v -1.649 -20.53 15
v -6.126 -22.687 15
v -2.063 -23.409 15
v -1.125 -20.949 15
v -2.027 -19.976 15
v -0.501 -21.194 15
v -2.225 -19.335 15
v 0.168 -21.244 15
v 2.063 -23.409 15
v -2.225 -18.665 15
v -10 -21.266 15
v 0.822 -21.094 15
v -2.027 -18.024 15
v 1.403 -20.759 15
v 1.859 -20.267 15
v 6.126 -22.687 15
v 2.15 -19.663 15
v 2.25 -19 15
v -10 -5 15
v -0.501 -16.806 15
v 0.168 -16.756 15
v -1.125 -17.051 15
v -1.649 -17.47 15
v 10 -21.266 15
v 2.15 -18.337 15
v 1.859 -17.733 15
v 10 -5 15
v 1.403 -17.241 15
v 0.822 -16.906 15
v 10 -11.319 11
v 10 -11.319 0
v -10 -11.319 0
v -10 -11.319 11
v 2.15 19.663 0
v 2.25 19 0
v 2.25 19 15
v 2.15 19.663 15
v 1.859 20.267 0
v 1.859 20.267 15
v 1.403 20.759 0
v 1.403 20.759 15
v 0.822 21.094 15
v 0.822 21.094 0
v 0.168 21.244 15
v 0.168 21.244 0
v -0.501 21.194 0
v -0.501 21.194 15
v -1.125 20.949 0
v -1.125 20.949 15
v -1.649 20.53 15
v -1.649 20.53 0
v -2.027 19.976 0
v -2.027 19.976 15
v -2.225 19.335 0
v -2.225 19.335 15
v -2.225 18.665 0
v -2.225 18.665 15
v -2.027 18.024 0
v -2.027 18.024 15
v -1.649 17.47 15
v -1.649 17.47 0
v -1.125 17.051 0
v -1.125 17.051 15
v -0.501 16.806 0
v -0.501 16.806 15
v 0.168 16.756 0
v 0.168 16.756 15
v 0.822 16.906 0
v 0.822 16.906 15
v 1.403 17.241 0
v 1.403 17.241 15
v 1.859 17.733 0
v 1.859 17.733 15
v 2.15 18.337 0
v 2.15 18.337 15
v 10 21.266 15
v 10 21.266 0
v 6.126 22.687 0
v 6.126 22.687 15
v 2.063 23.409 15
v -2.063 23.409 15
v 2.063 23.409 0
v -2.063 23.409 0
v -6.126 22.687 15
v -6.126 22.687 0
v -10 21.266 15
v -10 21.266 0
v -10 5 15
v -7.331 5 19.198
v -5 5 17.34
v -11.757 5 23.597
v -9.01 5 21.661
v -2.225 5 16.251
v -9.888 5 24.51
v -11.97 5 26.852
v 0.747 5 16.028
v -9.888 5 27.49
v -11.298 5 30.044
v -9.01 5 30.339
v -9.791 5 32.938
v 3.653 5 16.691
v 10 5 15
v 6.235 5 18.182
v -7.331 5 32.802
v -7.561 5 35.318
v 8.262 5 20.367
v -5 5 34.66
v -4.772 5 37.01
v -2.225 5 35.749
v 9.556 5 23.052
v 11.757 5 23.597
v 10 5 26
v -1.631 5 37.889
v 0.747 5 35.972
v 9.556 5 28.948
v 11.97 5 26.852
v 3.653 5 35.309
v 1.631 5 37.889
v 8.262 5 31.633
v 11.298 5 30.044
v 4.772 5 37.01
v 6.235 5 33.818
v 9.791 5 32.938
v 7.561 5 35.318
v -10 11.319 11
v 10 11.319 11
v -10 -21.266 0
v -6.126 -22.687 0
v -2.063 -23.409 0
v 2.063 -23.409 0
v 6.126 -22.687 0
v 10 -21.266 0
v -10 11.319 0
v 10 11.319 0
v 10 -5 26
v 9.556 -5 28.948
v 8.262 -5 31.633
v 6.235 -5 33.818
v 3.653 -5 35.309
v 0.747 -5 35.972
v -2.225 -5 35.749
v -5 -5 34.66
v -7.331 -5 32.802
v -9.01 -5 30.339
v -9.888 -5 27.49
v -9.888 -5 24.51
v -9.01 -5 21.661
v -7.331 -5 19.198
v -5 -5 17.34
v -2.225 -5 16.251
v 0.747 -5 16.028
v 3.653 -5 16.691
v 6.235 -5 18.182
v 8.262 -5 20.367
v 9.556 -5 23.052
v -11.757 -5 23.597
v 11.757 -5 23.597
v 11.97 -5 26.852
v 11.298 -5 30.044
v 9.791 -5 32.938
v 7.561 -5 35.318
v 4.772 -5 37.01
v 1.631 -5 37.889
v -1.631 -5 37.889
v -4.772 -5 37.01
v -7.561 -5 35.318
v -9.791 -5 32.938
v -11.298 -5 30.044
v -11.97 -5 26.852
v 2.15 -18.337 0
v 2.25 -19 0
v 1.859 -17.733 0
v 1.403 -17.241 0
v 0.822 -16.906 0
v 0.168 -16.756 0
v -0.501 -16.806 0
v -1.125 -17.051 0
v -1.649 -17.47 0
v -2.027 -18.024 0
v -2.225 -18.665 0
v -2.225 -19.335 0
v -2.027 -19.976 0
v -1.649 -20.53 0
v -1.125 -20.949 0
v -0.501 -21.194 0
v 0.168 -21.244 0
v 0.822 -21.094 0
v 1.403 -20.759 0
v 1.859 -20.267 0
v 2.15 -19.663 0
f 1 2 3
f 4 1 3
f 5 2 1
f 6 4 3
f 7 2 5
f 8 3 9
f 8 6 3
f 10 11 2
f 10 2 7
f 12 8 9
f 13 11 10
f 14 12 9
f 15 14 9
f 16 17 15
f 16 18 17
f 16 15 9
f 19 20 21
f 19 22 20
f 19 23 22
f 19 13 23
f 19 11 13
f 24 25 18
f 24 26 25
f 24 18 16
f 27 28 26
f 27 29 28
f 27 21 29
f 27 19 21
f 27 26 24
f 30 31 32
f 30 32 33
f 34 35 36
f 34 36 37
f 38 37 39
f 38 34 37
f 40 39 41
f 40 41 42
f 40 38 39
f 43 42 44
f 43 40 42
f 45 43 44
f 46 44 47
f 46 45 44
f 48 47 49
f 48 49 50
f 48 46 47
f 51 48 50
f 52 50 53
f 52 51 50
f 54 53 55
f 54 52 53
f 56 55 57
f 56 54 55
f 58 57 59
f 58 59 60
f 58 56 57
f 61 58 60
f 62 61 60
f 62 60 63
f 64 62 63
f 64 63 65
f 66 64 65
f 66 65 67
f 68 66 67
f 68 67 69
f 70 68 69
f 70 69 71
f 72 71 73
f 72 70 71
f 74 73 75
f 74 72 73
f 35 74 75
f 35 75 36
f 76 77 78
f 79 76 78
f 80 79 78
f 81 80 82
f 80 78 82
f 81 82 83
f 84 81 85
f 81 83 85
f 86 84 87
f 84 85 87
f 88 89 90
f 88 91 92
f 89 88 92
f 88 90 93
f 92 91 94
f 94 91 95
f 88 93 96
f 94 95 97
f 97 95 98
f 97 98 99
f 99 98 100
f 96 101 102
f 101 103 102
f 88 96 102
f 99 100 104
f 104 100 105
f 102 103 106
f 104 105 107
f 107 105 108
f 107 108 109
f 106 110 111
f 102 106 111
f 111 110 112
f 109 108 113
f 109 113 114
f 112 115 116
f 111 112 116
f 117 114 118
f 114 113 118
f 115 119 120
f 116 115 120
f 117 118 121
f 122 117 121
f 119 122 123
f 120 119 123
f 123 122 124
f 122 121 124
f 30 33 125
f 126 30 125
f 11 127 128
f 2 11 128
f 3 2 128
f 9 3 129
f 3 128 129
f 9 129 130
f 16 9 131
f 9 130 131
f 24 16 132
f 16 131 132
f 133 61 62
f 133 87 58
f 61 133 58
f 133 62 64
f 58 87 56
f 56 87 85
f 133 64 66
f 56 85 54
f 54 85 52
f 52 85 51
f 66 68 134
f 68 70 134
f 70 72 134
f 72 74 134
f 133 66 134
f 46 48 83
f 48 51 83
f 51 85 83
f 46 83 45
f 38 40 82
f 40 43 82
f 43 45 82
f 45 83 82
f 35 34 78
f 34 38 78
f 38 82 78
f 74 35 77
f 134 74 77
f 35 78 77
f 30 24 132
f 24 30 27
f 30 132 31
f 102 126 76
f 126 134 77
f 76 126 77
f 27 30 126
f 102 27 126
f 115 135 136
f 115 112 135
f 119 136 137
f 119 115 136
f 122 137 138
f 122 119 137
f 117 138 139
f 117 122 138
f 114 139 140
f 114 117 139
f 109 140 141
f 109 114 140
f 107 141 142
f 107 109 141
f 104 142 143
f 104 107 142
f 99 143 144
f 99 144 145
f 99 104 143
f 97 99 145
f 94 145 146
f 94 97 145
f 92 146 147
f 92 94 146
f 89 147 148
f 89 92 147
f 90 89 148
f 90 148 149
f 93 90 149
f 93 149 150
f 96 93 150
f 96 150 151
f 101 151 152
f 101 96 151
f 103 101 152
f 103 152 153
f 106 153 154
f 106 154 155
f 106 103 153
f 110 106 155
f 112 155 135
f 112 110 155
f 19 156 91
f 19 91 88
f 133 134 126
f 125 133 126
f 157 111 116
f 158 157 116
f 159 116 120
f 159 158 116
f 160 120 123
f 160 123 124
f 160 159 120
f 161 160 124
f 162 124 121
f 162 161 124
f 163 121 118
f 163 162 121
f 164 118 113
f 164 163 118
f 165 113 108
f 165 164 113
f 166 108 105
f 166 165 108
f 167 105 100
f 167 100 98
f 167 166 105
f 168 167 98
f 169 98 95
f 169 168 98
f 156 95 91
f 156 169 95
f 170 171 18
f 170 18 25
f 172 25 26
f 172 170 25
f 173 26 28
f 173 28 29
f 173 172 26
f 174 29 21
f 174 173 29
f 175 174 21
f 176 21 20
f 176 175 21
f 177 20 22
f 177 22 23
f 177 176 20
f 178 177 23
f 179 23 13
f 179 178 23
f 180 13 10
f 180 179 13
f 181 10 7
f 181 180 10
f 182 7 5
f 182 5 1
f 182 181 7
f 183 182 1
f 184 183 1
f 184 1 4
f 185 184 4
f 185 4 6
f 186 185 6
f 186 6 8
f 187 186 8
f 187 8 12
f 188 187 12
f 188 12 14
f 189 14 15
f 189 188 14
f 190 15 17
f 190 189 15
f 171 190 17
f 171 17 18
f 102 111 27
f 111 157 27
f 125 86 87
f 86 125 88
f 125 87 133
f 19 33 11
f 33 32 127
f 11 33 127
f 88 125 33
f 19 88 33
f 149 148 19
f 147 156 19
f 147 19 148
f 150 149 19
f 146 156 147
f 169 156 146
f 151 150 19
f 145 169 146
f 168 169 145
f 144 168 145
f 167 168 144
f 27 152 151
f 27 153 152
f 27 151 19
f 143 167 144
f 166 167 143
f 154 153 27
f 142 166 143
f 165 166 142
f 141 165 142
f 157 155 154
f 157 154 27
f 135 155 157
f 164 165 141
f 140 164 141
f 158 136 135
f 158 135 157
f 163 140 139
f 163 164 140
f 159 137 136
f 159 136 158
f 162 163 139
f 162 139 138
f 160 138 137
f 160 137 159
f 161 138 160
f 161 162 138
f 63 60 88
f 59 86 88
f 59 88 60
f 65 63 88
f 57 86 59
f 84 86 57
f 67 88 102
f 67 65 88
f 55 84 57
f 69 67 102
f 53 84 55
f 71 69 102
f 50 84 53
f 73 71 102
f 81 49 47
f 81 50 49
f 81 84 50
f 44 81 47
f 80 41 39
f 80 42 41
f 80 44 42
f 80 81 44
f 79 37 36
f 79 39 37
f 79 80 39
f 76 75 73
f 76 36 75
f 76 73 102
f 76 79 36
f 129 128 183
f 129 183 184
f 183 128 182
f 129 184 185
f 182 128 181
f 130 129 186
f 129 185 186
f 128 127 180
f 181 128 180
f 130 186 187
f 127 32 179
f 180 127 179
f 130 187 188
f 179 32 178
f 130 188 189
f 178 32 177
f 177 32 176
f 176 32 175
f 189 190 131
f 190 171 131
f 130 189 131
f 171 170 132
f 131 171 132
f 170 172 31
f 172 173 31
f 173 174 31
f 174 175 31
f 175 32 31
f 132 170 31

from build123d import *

# Parameters (mm, degrees)
SKETCH067_R          = 2.25
PAD043_DEPTH         = 15
SKETCH068_R          = 10
PAD044_DEPTH         = 5
SKETCH069_W          = 22.6375
SKETCH069_H          = 11
POCKET022_DEPTH      = 12.001
POCKET022_DEPTH_BACK = 12.001


with BuildPart() as part:
    # Sketch067 → Pad043 (new body)
    with BuildSketch(Plane.XY):
        with BuildLine():
            ThreePointArc((10, 21.26617), (0, 23.5), (-10, 21.26617))
            Line((-10, 21.26617), (-10, -21.26617))
            ThreePointArc((-10, -21.26617), (0, -23.5), (10, -21.26617))
            Line((10, -21.26617), (10, 21.26617))
        make_face()
        with Locations((0, 19)):
            Circle(SKETCH067_R, mode=Mode.SUBTRACT)
        with Locations((0, -19)):
            Circle(SKETCH067_R, mode=Mode.SUBTRACT)
    extrude(amount=PAD043_DEPTH)

    # Sketch068 → Pad044 (join, symmetric)
    with BuildSketch(Plane.XZ):
        with BuildLine():
            ThreePointArc((11.756992, 23.597266), (0, 38), (-11.756992, 23.597266))
            Line((-11.756992, 23.597266), (-10, 15))
            Line((10, 15), (-10, 15))
            Line((11.756992, 23.597266), (10, 15))
        make_face()
        with Locations((0, 26)):
            Circle(SKETCH068_R, mode=Mode.SUBTRACT)
    extrude(amount=PAD044_DEPTH, both=True)

    # Sketch069 → Pocket022 (cut, two sides)
    with BuildSketch(Plane.YZ) as pocket022_sk:
        with Locations((0, 5.5)):
            Rectangle(SKETCH069_W, SKETCH069_H)
    extrude(amount=-POCKET022_DEPTH, mode=Mode.SUBTRACT)
    extrude(pocket022_sk.sketch, amount=POCKET022_DEPTH_BACK, mode=Mode.SUBTRACT)


solid = part.part
